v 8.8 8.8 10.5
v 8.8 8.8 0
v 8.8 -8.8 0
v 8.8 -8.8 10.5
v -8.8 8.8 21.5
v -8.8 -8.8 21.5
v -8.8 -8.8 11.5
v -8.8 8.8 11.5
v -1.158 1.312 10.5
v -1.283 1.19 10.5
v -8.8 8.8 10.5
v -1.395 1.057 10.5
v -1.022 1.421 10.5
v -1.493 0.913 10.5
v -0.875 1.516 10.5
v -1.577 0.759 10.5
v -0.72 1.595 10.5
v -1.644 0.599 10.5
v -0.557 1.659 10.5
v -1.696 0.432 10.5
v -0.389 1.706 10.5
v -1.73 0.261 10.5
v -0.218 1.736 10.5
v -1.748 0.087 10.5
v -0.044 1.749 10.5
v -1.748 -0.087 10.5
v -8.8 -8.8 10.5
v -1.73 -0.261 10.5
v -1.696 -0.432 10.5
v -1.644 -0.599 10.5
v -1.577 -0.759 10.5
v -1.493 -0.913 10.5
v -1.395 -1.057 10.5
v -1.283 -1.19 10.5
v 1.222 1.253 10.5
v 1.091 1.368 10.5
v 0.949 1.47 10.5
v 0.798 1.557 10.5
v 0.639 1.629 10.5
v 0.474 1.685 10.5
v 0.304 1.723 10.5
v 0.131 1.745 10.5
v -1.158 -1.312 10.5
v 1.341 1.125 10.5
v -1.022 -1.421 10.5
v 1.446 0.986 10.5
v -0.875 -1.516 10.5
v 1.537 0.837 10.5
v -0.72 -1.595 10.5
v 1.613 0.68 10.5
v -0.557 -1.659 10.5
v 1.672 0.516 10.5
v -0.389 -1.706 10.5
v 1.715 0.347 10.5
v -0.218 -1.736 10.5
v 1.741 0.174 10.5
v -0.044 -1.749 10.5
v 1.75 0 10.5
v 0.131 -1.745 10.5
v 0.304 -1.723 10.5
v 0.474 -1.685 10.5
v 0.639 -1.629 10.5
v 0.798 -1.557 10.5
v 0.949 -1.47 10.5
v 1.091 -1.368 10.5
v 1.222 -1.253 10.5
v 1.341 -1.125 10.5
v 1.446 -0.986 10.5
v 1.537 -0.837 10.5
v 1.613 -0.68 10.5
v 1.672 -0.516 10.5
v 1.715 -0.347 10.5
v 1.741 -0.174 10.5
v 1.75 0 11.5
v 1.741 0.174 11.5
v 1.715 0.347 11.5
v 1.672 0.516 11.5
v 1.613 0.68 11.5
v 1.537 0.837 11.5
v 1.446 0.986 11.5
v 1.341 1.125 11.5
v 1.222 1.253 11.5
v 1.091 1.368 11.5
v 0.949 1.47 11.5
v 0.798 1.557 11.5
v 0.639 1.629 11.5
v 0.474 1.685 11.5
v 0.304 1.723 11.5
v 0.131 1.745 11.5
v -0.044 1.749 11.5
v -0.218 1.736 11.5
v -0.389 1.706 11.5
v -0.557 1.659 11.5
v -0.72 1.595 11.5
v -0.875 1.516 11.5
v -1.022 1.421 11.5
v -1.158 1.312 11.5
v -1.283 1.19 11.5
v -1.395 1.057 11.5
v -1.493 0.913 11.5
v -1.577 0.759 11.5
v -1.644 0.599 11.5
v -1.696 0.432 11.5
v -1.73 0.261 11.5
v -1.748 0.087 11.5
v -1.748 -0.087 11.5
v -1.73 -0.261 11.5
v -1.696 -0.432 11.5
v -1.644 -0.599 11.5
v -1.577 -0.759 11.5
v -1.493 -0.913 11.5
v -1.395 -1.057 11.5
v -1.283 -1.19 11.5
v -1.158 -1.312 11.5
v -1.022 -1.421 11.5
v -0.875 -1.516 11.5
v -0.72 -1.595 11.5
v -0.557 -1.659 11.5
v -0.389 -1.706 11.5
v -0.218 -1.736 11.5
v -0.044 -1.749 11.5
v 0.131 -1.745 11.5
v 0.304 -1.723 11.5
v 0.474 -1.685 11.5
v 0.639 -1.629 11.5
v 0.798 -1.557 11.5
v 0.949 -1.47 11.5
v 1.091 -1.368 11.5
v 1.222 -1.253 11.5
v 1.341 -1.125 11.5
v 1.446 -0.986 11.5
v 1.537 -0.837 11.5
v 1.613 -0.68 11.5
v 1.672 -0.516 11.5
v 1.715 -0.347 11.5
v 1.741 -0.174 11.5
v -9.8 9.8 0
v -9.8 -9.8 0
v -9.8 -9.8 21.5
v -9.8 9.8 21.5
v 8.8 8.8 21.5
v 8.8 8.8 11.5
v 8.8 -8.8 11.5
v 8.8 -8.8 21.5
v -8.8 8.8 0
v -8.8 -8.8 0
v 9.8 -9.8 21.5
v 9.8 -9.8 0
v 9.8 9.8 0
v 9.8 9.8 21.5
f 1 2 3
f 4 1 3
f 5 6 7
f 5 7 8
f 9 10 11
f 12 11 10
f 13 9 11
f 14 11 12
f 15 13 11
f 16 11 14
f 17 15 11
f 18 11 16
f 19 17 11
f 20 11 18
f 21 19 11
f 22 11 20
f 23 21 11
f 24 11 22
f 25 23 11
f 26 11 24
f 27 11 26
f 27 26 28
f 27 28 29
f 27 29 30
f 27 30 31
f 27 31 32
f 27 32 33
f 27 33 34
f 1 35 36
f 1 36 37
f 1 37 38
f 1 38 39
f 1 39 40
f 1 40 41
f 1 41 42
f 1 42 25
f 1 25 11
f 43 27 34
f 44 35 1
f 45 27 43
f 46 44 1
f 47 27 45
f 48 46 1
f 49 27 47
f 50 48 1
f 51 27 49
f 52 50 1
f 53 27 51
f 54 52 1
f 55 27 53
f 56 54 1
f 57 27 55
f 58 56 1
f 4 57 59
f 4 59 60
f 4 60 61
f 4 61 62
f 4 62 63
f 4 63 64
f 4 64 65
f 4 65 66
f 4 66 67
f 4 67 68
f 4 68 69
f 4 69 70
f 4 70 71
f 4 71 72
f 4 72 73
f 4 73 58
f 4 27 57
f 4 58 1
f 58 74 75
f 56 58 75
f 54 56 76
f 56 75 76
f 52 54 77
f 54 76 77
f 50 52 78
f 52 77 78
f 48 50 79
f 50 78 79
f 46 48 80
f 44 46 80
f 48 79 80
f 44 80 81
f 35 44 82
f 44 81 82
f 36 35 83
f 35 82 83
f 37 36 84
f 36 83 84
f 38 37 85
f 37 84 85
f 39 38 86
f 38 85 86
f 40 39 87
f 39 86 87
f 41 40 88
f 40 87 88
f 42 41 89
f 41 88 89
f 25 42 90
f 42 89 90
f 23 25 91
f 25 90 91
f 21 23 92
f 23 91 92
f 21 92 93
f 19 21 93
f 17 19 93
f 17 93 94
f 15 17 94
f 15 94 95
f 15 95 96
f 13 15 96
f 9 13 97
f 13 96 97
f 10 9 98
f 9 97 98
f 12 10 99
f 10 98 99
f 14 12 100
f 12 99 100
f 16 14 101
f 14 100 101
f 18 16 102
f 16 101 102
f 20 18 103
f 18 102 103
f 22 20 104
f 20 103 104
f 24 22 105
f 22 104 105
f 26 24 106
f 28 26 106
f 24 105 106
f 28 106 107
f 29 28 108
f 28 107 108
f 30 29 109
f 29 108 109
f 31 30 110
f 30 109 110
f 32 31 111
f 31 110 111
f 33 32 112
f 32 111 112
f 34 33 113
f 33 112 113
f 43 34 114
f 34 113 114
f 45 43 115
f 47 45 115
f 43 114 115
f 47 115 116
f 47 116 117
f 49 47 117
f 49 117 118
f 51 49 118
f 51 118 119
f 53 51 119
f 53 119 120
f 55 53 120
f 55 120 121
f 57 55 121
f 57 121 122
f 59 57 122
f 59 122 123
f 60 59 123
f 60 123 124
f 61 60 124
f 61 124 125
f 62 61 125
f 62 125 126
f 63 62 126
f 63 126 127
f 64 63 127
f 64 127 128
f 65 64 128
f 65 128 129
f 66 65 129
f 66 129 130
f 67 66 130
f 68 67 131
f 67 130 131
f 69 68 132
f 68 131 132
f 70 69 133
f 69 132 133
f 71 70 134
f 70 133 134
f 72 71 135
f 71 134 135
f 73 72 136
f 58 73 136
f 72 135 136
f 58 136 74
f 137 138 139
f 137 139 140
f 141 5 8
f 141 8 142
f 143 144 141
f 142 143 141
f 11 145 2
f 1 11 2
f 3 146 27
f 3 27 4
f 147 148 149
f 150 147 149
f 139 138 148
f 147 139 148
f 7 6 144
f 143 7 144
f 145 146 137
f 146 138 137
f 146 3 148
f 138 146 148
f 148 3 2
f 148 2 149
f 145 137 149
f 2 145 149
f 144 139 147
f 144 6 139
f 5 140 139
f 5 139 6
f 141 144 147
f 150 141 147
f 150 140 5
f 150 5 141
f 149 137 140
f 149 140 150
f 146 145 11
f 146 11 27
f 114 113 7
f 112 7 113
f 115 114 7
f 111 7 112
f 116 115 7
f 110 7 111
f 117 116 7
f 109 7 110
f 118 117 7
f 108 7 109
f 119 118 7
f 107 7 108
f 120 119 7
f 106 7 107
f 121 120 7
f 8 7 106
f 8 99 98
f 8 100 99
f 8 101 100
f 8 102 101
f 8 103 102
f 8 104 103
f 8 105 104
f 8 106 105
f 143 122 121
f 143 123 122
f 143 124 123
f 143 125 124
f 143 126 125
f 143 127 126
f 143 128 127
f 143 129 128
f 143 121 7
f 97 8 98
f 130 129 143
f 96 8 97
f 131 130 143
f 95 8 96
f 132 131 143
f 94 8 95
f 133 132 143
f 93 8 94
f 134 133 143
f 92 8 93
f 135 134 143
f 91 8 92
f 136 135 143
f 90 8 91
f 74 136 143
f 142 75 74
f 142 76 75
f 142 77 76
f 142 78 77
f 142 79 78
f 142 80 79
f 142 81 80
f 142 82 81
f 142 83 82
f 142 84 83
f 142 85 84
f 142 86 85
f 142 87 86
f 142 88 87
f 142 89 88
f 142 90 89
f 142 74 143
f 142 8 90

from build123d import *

# Parameters (mm, degrees)
F0_W     = 19.6
F0_H     = 19.6
F1_DEPTH = 21.5
F2_W     = 17.6
F2_H     = 17.6
F3_DEPTH = 10.5
F4_W     = 17.6
F4_H     = 17.6
F5_DEPTH = 10
F6_R     = 1.75
F7_DEPTH = 1


with BuildPart() as f1:
    # F0 (on Top) → F1 (new body)
    with BuildSketch(Plane.XY):
        Rectangle(F0_W, F0_H)
    extrude(amount=F1_DEPTH)

    # F2 (on face) → F3 (cut)
    with BuildSketch(Plane(origin=(0, 0, 0), x_dir=(1, 0, 0), z_dir=(0, 0, -1))):
        Rectangle(F2_W, F2_H)
    extrude(amount=-F3_DEPTH, mode=Mode.SUBTRACT)

    # F4 (on face) → F5 (cut)
    with BuildSketch(Plane.XY.offset(21.5)):
        Rectangle(F4_W, F4_H)
    extrude(amount=-F5_DEPTH, mode=Mode.SUBTRACT)

    # F6 (on face) → F7 (cut)
    with BuildSketch(Plane.XY.offset(11.5)):
        Circle(F6_R)
    extrude(amount=-F7_DEPTH, mode=Mode.SUBTRACT)


solid = f1.part
